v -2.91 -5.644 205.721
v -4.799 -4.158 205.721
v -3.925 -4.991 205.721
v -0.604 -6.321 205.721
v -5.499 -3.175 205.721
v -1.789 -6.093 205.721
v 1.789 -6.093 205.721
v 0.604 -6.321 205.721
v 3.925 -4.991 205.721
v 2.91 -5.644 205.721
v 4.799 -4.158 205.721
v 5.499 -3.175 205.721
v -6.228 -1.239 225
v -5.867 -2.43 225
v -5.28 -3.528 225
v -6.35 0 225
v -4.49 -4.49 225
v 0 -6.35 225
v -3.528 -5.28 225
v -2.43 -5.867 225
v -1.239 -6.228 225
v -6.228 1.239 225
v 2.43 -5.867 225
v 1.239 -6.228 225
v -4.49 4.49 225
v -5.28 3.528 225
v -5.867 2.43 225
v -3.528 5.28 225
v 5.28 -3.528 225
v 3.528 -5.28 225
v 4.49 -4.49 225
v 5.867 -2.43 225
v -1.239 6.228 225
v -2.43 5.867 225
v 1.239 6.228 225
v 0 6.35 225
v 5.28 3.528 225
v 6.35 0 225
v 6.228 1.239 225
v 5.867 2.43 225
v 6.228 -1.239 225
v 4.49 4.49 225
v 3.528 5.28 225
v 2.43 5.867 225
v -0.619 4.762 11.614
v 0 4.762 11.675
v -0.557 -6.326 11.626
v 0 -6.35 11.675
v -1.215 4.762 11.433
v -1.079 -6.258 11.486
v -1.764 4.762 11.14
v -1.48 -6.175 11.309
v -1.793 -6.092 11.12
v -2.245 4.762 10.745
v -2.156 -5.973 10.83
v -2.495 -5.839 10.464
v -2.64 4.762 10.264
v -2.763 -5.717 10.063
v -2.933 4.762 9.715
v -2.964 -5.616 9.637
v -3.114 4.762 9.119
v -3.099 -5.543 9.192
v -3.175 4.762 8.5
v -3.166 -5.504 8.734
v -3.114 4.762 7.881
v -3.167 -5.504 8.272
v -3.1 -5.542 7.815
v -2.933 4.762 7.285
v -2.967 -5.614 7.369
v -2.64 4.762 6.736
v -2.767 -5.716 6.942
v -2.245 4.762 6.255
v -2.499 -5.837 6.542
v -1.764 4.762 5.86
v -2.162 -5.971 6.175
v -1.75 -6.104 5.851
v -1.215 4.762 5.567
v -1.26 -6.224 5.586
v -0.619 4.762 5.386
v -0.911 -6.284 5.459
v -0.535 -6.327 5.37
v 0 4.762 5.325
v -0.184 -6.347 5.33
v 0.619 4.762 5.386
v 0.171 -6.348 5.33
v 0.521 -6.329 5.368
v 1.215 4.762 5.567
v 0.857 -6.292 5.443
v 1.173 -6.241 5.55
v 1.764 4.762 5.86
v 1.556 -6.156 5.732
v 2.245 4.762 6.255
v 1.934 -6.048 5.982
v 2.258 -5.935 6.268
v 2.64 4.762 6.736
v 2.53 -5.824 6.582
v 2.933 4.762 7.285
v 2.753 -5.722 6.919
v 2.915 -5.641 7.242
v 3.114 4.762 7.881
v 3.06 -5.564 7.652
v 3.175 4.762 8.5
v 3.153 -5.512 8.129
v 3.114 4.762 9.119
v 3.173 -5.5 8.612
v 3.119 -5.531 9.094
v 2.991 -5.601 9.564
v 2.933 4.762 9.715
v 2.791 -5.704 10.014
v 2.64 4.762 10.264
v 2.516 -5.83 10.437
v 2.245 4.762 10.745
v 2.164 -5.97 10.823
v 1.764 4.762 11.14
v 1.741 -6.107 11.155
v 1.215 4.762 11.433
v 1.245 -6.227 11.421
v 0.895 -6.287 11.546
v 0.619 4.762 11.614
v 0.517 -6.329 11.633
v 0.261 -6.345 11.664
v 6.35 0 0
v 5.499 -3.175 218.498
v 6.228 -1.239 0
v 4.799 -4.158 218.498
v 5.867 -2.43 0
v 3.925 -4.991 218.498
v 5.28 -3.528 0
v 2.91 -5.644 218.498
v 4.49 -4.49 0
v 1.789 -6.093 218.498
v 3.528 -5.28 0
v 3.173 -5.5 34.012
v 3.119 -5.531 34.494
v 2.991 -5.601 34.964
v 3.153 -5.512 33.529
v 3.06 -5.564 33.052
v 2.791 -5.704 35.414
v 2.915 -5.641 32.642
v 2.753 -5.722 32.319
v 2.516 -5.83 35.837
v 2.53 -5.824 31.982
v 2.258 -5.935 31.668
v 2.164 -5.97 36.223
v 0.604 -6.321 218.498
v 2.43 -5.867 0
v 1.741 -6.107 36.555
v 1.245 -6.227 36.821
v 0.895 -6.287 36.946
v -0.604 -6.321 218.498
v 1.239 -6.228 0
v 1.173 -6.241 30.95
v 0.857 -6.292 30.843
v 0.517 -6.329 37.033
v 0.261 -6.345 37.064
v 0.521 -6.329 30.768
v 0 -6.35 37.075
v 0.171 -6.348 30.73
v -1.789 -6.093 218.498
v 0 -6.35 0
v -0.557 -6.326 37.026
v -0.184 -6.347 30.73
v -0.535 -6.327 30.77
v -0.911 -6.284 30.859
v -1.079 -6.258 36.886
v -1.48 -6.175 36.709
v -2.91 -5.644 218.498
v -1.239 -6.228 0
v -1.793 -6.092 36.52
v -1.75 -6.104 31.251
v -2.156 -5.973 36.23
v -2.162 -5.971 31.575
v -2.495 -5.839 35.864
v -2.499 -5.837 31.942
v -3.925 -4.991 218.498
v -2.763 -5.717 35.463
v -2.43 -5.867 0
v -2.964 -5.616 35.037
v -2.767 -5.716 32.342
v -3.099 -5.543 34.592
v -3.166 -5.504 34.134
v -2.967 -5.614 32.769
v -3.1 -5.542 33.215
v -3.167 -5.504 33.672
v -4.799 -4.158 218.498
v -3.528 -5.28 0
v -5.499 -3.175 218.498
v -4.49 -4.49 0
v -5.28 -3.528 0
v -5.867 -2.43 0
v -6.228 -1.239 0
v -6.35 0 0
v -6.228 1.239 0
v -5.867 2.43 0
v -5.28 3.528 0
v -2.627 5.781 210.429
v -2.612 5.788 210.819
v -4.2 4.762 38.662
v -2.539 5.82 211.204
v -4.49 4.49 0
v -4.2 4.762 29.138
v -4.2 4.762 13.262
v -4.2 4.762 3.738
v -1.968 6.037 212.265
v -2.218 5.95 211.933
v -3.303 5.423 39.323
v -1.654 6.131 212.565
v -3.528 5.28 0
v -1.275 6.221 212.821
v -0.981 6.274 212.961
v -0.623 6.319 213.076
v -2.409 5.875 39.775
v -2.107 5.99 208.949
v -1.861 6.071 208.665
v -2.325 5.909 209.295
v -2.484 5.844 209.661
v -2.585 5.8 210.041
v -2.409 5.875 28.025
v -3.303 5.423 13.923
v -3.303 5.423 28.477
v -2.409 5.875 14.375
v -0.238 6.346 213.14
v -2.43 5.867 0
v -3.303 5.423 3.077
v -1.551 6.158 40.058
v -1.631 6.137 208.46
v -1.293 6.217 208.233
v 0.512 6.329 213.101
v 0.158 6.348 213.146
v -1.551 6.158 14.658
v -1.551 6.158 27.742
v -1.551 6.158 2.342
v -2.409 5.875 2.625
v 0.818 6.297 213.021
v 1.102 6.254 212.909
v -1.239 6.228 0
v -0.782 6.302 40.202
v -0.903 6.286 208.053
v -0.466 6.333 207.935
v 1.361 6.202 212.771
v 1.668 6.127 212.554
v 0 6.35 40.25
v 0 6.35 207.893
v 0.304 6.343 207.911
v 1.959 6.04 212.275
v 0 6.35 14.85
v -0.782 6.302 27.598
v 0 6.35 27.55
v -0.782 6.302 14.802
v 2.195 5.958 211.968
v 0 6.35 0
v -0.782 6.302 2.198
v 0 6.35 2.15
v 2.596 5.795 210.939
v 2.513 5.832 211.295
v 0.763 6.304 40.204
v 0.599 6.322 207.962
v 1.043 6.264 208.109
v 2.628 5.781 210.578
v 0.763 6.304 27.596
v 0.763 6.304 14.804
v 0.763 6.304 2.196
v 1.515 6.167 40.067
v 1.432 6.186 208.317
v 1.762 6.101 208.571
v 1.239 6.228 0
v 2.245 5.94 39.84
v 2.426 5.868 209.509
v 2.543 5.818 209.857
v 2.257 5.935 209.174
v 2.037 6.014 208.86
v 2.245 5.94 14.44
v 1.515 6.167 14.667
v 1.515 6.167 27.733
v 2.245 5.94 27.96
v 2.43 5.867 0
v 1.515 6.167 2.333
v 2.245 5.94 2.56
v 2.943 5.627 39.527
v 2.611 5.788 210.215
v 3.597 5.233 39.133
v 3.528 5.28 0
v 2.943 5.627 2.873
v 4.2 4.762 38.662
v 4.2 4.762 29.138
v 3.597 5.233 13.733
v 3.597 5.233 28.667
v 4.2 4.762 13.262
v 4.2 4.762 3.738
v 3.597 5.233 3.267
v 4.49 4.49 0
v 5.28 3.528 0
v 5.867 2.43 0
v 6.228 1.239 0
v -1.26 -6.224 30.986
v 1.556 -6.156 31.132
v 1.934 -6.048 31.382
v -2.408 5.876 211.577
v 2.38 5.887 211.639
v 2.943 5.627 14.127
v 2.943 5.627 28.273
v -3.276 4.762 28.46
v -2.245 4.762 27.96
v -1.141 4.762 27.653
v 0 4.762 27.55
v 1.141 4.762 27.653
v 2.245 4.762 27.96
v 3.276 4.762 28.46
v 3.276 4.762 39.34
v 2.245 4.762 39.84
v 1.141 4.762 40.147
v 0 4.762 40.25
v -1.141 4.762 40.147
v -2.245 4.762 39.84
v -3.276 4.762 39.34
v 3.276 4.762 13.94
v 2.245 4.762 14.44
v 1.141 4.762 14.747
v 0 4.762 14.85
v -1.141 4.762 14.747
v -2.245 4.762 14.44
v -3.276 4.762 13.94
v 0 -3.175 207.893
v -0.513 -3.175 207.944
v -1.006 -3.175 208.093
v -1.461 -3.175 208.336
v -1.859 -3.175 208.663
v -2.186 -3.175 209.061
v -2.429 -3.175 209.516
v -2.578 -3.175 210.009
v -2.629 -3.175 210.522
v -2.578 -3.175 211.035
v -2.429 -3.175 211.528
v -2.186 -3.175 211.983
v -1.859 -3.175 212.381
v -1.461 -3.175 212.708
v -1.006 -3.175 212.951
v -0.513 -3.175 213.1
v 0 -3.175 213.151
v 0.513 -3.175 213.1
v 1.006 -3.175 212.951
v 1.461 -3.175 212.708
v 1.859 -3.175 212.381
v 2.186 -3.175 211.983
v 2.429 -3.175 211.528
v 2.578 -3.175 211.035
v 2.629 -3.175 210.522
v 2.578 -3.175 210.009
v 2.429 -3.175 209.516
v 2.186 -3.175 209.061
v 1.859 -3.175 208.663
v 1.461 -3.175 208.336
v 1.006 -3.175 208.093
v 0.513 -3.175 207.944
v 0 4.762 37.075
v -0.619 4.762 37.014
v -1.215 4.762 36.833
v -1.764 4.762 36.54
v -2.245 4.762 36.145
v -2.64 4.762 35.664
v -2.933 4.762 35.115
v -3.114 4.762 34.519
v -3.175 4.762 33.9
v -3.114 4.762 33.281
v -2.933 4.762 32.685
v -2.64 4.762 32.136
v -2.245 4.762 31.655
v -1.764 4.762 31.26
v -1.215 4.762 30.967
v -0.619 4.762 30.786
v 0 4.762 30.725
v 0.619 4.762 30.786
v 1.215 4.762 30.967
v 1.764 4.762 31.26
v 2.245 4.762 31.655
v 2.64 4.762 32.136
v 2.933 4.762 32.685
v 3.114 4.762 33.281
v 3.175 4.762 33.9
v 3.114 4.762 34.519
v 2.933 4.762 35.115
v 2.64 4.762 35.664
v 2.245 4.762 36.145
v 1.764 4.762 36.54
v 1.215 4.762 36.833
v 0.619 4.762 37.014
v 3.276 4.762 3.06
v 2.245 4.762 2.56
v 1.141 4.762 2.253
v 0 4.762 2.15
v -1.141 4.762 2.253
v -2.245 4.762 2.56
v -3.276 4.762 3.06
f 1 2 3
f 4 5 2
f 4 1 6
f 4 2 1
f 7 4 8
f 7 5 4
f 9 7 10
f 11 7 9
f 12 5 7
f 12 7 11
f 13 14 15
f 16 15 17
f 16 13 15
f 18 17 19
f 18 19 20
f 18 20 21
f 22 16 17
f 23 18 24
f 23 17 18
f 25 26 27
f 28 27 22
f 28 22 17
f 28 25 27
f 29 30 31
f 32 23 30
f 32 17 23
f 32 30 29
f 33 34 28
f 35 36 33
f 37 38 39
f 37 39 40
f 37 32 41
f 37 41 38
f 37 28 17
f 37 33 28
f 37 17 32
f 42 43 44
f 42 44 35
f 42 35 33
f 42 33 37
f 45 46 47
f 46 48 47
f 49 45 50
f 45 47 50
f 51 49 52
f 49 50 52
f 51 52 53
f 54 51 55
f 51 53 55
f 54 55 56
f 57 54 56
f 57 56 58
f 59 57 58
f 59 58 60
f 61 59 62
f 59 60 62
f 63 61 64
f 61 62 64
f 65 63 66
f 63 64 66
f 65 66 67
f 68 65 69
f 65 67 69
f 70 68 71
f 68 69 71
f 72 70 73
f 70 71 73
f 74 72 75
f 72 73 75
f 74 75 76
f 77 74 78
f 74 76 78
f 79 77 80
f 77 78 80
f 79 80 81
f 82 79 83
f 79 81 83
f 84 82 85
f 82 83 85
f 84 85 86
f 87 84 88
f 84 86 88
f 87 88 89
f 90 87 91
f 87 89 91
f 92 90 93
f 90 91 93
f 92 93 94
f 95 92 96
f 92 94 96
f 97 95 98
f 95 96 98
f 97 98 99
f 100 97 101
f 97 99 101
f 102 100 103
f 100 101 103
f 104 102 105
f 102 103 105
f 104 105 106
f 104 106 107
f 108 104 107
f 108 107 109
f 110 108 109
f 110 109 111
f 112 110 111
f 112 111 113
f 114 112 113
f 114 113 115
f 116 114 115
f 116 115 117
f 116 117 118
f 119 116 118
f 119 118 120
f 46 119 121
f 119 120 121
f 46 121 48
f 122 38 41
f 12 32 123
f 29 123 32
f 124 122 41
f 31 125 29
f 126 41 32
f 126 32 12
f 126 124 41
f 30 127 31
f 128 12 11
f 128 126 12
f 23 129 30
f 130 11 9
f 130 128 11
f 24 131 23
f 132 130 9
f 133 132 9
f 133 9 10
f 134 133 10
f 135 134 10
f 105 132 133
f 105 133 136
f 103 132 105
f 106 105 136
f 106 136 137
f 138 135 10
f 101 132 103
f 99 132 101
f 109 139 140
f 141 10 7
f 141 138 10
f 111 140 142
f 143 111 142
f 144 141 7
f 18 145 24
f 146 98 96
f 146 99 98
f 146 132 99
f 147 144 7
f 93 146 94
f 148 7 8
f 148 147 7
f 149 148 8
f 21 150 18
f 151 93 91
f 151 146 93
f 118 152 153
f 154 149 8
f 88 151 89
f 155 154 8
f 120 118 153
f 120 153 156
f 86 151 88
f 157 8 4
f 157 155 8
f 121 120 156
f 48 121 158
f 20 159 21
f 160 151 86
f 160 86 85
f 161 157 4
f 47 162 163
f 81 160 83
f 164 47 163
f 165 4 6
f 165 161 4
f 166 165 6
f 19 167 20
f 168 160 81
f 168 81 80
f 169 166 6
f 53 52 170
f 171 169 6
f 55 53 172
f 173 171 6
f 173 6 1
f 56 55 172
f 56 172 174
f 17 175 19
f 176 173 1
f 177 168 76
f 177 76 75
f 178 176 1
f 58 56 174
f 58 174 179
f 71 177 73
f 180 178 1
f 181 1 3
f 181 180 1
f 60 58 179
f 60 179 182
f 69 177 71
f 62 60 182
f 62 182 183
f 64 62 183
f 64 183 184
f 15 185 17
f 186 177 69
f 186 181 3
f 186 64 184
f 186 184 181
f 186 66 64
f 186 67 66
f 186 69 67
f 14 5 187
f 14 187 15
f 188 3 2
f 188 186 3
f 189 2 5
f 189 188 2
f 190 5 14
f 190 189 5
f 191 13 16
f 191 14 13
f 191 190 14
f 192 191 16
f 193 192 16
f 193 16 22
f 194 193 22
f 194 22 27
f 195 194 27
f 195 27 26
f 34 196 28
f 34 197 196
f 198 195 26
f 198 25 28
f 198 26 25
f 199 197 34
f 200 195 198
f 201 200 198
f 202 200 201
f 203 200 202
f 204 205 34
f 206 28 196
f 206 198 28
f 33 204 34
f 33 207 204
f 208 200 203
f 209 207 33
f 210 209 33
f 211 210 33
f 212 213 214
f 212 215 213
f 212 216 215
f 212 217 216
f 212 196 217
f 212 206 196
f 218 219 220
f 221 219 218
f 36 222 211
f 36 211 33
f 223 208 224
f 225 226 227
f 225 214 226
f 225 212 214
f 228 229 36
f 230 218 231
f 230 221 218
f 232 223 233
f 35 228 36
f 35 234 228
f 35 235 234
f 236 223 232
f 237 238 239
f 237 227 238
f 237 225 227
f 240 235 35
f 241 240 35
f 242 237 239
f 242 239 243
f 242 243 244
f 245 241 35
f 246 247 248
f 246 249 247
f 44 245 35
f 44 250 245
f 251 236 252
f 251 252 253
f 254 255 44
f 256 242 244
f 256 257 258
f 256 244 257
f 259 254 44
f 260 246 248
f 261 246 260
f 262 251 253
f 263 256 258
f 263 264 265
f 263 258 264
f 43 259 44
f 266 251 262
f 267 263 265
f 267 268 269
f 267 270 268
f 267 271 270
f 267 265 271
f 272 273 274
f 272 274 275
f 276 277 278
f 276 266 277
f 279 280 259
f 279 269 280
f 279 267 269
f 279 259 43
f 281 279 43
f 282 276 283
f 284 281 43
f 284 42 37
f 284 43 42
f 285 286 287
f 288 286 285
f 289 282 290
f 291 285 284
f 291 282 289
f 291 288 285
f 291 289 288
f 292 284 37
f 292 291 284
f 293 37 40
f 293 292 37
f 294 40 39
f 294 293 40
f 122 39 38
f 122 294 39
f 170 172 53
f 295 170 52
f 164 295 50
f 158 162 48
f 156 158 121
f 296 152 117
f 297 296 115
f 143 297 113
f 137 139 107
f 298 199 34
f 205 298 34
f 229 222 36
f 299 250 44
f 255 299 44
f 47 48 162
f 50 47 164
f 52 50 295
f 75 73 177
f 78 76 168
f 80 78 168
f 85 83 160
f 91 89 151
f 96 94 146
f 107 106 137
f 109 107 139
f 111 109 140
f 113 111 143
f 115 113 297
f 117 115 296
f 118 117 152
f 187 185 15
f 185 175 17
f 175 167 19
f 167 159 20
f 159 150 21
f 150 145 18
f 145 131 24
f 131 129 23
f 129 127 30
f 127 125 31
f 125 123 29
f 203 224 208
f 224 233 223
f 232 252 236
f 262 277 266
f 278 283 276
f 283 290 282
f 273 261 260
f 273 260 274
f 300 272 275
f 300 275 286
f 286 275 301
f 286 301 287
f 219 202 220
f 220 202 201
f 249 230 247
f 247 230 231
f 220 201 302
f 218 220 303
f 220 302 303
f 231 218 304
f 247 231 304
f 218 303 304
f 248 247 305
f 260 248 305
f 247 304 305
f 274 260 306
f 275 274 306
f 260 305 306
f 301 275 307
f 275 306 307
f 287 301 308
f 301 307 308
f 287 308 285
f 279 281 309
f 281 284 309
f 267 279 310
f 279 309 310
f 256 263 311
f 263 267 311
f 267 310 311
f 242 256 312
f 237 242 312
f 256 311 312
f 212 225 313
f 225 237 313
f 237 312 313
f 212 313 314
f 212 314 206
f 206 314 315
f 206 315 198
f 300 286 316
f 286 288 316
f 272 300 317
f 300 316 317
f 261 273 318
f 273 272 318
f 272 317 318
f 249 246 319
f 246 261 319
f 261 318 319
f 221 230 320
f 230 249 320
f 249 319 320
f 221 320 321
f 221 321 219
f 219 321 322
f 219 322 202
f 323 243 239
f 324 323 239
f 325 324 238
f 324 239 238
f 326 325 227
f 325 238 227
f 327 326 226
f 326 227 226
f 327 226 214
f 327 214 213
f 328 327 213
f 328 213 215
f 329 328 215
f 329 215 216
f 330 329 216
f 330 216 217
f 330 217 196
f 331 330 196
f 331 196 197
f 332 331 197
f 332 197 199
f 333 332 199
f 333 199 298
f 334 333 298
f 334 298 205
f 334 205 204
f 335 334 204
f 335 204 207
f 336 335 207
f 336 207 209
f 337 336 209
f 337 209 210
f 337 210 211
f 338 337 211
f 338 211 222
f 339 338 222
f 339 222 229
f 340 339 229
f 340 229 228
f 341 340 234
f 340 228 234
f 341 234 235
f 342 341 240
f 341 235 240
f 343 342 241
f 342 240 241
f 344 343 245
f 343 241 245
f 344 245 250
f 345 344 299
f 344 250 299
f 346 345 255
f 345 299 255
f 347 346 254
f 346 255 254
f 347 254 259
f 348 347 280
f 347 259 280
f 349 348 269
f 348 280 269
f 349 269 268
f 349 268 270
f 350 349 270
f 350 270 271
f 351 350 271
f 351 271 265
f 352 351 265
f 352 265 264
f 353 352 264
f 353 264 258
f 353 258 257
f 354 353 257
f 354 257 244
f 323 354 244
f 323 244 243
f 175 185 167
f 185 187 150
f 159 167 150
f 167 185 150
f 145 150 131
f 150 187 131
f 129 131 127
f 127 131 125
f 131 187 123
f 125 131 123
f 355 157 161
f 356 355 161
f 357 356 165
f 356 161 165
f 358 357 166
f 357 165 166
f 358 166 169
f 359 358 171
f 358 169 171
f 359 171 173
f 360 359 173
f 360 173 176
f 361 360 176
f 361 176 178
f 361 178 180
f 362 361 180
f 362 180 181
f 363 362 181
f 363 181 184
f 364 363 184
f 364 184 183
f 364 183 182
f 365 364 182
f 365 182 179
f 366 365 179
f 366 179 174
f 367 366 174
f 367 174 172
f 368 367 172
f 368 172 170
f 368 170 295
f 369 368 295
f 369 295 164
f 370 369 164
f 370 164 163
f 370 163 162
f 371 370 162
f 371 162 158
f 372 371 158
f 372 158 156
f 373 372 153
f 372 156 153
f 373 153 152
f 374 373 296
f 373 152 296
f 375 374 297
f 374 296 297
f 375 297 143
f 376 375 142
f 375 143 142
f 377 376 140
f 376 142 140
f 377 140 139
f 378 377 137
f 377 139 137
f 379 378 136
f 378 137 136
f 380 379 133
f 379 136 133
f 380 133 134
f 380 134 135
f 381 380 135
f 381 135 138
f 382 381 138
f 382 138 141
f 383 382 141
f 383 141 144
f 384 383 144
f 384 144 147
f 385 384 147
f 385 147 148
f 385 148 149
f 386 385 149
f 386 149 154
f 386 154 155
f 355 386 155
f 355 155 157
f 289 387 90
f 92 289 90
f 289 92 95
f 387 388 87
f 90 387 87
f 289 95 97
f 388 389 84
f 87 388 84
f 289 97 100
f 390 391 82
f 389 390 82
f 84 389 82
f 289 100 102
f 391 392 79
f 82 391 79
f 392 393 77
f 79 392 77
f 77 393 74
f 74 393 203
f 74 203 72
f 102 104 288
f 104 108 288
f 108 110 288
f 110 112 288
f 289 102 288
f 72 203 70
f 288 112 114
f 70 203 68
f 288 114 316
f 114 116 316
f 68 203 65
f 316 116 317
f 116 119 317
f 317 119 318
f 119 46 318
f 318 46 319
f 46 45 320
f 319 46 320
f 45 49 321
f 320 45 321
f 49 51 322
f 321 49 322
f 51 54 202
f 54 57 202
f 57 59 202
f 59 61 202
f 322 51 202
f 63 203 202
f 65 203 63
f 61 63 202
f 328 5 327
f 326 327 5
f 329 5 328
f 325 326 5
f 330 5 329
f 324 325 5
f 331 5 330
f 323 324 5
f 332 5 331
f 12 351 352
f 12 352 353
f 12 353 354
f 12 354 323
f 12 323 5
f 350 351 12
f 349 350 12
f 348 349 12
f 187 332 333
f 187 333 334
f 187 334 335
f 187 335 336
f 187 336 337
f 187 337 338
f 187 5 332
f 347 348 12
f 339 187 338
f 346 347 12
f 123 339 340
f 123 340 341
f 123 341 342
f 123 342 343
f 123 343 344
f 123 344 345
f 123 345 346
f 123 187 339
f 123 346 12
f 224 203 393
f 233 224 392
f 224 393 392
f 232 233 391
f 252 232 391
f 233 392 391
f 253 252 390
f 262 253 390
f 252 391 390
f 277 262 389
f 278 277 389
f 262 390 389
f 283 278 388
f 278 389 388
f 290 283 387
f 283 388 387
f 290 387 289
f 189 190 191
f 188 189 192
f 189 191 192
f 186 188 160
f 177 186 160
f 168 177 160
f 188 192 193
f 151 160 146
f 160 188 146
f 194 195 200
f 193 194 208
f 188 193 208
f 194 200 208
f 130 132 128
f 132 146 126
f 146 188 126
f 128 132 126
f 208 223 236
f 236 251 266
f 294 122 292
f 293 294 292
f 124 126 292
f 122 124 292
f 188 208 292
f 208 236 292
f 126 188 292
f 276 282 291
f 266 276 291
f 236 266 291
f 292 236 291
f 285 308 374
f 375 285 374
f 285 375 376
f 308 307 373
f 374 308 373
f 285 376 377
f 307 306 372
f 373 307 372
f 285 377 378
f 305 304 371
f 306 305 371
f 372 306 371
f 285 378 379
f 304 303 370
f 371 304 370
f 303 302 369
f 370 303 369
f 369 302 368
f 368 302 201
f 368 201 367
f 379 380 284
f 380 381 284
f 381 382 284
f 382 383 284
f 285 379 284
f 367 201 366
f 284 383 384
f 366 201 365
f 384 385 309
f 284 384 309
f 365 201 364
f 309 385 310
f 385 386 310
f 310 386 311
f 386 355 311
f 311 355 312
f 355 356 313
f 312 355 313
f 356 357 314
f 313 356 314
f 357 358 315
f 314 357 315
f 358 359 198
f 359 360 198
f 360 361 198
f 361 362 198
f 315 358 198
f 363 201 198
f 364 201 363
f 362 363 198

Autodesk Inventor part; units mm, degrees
ref_plane "YZ Plane" through (0, 0, 0) normal (1, 0, 0) x (0, 1, 0)
sketch "Sketch1" plane through (0, 0, 0) normal (0, 0, 1) x (1, 0, 0)
  circle A0 centre (0, 0) radius 6.35
  dimension "d0" = 12.7
extrude "Extrusion1" add sketch "Sketch1" along normal blind 225
ref_plane "Work Plane2" through (0, 0, 218.4976) normal (0, 0, 1) x (1, 0, 0)
sketch "Sketch2" plane through (0, 0, 218.4976) normal (0, 0, 1) x (1, 0, 0)
  circle A0 centre (0, 0) radius 6.35
  line L0 (-5.4993, -3.175) -> (5.4993, -3.175)
  dimension "d3" = 9.525
extrude "Extrusion3" cut sketch "Sketch2" against normal blind 12.7762 contours L0 A0 picked at (-1.5396, -3.5692)
sketch "Sketch3" plane through (-5.4993, -3.175, 218.4976) normal (0, -1, 0) x (1, 0, 0)
  line L0 (0, 0) -> (10.9985, 0)
  line L1 (10.9985, -12.7762) -> (0, -12.7762) projected
  line L2 (10.9985, 0) -> (10.9985, -12.7762) projected
  line L3 (10.9985, 0) -> (0, 0) projected
  line L4 (0, -12.7762) -> (0, 0) projected
  point P0 (5.4993, -7.9756)
  dimension "d6" = 7.9756
hole "Hole1" at (0, -3.175, 210.522) direction (0, 1, 0) diameter 5.2578 end through all thread size "1/4-20 UNC" class "2B" standard "ANSI Unified Screw Threads"
ref_plane "Work Plane1" through (0, 6.35, 0) normal (0, 1, 0) x (-1, 0, 0)
sketch "Sketch4" plane through (0, 6.35, 0) normal (0, 1, 0) x (-1, 0, 0)
  line L0 (-6.35, 0) -> (6.35, 0) projected
  point P0 (0, 8.5)
  point P1 (0, 33.9)
  point P2 (0, 210.522)
  dimension "d14" = 25.4
  dimension "d28" = 8.5
hole "Hole2" at (0, 6.35, 8.5) at (0, 6.35, 33.9) direction (0, -1, 0) diameter 6.35 end through all counterbore diameter 12.7 counterbore depth 1.5875
properties part number "PWTR-0031" material "Stainless Steel, 303"
